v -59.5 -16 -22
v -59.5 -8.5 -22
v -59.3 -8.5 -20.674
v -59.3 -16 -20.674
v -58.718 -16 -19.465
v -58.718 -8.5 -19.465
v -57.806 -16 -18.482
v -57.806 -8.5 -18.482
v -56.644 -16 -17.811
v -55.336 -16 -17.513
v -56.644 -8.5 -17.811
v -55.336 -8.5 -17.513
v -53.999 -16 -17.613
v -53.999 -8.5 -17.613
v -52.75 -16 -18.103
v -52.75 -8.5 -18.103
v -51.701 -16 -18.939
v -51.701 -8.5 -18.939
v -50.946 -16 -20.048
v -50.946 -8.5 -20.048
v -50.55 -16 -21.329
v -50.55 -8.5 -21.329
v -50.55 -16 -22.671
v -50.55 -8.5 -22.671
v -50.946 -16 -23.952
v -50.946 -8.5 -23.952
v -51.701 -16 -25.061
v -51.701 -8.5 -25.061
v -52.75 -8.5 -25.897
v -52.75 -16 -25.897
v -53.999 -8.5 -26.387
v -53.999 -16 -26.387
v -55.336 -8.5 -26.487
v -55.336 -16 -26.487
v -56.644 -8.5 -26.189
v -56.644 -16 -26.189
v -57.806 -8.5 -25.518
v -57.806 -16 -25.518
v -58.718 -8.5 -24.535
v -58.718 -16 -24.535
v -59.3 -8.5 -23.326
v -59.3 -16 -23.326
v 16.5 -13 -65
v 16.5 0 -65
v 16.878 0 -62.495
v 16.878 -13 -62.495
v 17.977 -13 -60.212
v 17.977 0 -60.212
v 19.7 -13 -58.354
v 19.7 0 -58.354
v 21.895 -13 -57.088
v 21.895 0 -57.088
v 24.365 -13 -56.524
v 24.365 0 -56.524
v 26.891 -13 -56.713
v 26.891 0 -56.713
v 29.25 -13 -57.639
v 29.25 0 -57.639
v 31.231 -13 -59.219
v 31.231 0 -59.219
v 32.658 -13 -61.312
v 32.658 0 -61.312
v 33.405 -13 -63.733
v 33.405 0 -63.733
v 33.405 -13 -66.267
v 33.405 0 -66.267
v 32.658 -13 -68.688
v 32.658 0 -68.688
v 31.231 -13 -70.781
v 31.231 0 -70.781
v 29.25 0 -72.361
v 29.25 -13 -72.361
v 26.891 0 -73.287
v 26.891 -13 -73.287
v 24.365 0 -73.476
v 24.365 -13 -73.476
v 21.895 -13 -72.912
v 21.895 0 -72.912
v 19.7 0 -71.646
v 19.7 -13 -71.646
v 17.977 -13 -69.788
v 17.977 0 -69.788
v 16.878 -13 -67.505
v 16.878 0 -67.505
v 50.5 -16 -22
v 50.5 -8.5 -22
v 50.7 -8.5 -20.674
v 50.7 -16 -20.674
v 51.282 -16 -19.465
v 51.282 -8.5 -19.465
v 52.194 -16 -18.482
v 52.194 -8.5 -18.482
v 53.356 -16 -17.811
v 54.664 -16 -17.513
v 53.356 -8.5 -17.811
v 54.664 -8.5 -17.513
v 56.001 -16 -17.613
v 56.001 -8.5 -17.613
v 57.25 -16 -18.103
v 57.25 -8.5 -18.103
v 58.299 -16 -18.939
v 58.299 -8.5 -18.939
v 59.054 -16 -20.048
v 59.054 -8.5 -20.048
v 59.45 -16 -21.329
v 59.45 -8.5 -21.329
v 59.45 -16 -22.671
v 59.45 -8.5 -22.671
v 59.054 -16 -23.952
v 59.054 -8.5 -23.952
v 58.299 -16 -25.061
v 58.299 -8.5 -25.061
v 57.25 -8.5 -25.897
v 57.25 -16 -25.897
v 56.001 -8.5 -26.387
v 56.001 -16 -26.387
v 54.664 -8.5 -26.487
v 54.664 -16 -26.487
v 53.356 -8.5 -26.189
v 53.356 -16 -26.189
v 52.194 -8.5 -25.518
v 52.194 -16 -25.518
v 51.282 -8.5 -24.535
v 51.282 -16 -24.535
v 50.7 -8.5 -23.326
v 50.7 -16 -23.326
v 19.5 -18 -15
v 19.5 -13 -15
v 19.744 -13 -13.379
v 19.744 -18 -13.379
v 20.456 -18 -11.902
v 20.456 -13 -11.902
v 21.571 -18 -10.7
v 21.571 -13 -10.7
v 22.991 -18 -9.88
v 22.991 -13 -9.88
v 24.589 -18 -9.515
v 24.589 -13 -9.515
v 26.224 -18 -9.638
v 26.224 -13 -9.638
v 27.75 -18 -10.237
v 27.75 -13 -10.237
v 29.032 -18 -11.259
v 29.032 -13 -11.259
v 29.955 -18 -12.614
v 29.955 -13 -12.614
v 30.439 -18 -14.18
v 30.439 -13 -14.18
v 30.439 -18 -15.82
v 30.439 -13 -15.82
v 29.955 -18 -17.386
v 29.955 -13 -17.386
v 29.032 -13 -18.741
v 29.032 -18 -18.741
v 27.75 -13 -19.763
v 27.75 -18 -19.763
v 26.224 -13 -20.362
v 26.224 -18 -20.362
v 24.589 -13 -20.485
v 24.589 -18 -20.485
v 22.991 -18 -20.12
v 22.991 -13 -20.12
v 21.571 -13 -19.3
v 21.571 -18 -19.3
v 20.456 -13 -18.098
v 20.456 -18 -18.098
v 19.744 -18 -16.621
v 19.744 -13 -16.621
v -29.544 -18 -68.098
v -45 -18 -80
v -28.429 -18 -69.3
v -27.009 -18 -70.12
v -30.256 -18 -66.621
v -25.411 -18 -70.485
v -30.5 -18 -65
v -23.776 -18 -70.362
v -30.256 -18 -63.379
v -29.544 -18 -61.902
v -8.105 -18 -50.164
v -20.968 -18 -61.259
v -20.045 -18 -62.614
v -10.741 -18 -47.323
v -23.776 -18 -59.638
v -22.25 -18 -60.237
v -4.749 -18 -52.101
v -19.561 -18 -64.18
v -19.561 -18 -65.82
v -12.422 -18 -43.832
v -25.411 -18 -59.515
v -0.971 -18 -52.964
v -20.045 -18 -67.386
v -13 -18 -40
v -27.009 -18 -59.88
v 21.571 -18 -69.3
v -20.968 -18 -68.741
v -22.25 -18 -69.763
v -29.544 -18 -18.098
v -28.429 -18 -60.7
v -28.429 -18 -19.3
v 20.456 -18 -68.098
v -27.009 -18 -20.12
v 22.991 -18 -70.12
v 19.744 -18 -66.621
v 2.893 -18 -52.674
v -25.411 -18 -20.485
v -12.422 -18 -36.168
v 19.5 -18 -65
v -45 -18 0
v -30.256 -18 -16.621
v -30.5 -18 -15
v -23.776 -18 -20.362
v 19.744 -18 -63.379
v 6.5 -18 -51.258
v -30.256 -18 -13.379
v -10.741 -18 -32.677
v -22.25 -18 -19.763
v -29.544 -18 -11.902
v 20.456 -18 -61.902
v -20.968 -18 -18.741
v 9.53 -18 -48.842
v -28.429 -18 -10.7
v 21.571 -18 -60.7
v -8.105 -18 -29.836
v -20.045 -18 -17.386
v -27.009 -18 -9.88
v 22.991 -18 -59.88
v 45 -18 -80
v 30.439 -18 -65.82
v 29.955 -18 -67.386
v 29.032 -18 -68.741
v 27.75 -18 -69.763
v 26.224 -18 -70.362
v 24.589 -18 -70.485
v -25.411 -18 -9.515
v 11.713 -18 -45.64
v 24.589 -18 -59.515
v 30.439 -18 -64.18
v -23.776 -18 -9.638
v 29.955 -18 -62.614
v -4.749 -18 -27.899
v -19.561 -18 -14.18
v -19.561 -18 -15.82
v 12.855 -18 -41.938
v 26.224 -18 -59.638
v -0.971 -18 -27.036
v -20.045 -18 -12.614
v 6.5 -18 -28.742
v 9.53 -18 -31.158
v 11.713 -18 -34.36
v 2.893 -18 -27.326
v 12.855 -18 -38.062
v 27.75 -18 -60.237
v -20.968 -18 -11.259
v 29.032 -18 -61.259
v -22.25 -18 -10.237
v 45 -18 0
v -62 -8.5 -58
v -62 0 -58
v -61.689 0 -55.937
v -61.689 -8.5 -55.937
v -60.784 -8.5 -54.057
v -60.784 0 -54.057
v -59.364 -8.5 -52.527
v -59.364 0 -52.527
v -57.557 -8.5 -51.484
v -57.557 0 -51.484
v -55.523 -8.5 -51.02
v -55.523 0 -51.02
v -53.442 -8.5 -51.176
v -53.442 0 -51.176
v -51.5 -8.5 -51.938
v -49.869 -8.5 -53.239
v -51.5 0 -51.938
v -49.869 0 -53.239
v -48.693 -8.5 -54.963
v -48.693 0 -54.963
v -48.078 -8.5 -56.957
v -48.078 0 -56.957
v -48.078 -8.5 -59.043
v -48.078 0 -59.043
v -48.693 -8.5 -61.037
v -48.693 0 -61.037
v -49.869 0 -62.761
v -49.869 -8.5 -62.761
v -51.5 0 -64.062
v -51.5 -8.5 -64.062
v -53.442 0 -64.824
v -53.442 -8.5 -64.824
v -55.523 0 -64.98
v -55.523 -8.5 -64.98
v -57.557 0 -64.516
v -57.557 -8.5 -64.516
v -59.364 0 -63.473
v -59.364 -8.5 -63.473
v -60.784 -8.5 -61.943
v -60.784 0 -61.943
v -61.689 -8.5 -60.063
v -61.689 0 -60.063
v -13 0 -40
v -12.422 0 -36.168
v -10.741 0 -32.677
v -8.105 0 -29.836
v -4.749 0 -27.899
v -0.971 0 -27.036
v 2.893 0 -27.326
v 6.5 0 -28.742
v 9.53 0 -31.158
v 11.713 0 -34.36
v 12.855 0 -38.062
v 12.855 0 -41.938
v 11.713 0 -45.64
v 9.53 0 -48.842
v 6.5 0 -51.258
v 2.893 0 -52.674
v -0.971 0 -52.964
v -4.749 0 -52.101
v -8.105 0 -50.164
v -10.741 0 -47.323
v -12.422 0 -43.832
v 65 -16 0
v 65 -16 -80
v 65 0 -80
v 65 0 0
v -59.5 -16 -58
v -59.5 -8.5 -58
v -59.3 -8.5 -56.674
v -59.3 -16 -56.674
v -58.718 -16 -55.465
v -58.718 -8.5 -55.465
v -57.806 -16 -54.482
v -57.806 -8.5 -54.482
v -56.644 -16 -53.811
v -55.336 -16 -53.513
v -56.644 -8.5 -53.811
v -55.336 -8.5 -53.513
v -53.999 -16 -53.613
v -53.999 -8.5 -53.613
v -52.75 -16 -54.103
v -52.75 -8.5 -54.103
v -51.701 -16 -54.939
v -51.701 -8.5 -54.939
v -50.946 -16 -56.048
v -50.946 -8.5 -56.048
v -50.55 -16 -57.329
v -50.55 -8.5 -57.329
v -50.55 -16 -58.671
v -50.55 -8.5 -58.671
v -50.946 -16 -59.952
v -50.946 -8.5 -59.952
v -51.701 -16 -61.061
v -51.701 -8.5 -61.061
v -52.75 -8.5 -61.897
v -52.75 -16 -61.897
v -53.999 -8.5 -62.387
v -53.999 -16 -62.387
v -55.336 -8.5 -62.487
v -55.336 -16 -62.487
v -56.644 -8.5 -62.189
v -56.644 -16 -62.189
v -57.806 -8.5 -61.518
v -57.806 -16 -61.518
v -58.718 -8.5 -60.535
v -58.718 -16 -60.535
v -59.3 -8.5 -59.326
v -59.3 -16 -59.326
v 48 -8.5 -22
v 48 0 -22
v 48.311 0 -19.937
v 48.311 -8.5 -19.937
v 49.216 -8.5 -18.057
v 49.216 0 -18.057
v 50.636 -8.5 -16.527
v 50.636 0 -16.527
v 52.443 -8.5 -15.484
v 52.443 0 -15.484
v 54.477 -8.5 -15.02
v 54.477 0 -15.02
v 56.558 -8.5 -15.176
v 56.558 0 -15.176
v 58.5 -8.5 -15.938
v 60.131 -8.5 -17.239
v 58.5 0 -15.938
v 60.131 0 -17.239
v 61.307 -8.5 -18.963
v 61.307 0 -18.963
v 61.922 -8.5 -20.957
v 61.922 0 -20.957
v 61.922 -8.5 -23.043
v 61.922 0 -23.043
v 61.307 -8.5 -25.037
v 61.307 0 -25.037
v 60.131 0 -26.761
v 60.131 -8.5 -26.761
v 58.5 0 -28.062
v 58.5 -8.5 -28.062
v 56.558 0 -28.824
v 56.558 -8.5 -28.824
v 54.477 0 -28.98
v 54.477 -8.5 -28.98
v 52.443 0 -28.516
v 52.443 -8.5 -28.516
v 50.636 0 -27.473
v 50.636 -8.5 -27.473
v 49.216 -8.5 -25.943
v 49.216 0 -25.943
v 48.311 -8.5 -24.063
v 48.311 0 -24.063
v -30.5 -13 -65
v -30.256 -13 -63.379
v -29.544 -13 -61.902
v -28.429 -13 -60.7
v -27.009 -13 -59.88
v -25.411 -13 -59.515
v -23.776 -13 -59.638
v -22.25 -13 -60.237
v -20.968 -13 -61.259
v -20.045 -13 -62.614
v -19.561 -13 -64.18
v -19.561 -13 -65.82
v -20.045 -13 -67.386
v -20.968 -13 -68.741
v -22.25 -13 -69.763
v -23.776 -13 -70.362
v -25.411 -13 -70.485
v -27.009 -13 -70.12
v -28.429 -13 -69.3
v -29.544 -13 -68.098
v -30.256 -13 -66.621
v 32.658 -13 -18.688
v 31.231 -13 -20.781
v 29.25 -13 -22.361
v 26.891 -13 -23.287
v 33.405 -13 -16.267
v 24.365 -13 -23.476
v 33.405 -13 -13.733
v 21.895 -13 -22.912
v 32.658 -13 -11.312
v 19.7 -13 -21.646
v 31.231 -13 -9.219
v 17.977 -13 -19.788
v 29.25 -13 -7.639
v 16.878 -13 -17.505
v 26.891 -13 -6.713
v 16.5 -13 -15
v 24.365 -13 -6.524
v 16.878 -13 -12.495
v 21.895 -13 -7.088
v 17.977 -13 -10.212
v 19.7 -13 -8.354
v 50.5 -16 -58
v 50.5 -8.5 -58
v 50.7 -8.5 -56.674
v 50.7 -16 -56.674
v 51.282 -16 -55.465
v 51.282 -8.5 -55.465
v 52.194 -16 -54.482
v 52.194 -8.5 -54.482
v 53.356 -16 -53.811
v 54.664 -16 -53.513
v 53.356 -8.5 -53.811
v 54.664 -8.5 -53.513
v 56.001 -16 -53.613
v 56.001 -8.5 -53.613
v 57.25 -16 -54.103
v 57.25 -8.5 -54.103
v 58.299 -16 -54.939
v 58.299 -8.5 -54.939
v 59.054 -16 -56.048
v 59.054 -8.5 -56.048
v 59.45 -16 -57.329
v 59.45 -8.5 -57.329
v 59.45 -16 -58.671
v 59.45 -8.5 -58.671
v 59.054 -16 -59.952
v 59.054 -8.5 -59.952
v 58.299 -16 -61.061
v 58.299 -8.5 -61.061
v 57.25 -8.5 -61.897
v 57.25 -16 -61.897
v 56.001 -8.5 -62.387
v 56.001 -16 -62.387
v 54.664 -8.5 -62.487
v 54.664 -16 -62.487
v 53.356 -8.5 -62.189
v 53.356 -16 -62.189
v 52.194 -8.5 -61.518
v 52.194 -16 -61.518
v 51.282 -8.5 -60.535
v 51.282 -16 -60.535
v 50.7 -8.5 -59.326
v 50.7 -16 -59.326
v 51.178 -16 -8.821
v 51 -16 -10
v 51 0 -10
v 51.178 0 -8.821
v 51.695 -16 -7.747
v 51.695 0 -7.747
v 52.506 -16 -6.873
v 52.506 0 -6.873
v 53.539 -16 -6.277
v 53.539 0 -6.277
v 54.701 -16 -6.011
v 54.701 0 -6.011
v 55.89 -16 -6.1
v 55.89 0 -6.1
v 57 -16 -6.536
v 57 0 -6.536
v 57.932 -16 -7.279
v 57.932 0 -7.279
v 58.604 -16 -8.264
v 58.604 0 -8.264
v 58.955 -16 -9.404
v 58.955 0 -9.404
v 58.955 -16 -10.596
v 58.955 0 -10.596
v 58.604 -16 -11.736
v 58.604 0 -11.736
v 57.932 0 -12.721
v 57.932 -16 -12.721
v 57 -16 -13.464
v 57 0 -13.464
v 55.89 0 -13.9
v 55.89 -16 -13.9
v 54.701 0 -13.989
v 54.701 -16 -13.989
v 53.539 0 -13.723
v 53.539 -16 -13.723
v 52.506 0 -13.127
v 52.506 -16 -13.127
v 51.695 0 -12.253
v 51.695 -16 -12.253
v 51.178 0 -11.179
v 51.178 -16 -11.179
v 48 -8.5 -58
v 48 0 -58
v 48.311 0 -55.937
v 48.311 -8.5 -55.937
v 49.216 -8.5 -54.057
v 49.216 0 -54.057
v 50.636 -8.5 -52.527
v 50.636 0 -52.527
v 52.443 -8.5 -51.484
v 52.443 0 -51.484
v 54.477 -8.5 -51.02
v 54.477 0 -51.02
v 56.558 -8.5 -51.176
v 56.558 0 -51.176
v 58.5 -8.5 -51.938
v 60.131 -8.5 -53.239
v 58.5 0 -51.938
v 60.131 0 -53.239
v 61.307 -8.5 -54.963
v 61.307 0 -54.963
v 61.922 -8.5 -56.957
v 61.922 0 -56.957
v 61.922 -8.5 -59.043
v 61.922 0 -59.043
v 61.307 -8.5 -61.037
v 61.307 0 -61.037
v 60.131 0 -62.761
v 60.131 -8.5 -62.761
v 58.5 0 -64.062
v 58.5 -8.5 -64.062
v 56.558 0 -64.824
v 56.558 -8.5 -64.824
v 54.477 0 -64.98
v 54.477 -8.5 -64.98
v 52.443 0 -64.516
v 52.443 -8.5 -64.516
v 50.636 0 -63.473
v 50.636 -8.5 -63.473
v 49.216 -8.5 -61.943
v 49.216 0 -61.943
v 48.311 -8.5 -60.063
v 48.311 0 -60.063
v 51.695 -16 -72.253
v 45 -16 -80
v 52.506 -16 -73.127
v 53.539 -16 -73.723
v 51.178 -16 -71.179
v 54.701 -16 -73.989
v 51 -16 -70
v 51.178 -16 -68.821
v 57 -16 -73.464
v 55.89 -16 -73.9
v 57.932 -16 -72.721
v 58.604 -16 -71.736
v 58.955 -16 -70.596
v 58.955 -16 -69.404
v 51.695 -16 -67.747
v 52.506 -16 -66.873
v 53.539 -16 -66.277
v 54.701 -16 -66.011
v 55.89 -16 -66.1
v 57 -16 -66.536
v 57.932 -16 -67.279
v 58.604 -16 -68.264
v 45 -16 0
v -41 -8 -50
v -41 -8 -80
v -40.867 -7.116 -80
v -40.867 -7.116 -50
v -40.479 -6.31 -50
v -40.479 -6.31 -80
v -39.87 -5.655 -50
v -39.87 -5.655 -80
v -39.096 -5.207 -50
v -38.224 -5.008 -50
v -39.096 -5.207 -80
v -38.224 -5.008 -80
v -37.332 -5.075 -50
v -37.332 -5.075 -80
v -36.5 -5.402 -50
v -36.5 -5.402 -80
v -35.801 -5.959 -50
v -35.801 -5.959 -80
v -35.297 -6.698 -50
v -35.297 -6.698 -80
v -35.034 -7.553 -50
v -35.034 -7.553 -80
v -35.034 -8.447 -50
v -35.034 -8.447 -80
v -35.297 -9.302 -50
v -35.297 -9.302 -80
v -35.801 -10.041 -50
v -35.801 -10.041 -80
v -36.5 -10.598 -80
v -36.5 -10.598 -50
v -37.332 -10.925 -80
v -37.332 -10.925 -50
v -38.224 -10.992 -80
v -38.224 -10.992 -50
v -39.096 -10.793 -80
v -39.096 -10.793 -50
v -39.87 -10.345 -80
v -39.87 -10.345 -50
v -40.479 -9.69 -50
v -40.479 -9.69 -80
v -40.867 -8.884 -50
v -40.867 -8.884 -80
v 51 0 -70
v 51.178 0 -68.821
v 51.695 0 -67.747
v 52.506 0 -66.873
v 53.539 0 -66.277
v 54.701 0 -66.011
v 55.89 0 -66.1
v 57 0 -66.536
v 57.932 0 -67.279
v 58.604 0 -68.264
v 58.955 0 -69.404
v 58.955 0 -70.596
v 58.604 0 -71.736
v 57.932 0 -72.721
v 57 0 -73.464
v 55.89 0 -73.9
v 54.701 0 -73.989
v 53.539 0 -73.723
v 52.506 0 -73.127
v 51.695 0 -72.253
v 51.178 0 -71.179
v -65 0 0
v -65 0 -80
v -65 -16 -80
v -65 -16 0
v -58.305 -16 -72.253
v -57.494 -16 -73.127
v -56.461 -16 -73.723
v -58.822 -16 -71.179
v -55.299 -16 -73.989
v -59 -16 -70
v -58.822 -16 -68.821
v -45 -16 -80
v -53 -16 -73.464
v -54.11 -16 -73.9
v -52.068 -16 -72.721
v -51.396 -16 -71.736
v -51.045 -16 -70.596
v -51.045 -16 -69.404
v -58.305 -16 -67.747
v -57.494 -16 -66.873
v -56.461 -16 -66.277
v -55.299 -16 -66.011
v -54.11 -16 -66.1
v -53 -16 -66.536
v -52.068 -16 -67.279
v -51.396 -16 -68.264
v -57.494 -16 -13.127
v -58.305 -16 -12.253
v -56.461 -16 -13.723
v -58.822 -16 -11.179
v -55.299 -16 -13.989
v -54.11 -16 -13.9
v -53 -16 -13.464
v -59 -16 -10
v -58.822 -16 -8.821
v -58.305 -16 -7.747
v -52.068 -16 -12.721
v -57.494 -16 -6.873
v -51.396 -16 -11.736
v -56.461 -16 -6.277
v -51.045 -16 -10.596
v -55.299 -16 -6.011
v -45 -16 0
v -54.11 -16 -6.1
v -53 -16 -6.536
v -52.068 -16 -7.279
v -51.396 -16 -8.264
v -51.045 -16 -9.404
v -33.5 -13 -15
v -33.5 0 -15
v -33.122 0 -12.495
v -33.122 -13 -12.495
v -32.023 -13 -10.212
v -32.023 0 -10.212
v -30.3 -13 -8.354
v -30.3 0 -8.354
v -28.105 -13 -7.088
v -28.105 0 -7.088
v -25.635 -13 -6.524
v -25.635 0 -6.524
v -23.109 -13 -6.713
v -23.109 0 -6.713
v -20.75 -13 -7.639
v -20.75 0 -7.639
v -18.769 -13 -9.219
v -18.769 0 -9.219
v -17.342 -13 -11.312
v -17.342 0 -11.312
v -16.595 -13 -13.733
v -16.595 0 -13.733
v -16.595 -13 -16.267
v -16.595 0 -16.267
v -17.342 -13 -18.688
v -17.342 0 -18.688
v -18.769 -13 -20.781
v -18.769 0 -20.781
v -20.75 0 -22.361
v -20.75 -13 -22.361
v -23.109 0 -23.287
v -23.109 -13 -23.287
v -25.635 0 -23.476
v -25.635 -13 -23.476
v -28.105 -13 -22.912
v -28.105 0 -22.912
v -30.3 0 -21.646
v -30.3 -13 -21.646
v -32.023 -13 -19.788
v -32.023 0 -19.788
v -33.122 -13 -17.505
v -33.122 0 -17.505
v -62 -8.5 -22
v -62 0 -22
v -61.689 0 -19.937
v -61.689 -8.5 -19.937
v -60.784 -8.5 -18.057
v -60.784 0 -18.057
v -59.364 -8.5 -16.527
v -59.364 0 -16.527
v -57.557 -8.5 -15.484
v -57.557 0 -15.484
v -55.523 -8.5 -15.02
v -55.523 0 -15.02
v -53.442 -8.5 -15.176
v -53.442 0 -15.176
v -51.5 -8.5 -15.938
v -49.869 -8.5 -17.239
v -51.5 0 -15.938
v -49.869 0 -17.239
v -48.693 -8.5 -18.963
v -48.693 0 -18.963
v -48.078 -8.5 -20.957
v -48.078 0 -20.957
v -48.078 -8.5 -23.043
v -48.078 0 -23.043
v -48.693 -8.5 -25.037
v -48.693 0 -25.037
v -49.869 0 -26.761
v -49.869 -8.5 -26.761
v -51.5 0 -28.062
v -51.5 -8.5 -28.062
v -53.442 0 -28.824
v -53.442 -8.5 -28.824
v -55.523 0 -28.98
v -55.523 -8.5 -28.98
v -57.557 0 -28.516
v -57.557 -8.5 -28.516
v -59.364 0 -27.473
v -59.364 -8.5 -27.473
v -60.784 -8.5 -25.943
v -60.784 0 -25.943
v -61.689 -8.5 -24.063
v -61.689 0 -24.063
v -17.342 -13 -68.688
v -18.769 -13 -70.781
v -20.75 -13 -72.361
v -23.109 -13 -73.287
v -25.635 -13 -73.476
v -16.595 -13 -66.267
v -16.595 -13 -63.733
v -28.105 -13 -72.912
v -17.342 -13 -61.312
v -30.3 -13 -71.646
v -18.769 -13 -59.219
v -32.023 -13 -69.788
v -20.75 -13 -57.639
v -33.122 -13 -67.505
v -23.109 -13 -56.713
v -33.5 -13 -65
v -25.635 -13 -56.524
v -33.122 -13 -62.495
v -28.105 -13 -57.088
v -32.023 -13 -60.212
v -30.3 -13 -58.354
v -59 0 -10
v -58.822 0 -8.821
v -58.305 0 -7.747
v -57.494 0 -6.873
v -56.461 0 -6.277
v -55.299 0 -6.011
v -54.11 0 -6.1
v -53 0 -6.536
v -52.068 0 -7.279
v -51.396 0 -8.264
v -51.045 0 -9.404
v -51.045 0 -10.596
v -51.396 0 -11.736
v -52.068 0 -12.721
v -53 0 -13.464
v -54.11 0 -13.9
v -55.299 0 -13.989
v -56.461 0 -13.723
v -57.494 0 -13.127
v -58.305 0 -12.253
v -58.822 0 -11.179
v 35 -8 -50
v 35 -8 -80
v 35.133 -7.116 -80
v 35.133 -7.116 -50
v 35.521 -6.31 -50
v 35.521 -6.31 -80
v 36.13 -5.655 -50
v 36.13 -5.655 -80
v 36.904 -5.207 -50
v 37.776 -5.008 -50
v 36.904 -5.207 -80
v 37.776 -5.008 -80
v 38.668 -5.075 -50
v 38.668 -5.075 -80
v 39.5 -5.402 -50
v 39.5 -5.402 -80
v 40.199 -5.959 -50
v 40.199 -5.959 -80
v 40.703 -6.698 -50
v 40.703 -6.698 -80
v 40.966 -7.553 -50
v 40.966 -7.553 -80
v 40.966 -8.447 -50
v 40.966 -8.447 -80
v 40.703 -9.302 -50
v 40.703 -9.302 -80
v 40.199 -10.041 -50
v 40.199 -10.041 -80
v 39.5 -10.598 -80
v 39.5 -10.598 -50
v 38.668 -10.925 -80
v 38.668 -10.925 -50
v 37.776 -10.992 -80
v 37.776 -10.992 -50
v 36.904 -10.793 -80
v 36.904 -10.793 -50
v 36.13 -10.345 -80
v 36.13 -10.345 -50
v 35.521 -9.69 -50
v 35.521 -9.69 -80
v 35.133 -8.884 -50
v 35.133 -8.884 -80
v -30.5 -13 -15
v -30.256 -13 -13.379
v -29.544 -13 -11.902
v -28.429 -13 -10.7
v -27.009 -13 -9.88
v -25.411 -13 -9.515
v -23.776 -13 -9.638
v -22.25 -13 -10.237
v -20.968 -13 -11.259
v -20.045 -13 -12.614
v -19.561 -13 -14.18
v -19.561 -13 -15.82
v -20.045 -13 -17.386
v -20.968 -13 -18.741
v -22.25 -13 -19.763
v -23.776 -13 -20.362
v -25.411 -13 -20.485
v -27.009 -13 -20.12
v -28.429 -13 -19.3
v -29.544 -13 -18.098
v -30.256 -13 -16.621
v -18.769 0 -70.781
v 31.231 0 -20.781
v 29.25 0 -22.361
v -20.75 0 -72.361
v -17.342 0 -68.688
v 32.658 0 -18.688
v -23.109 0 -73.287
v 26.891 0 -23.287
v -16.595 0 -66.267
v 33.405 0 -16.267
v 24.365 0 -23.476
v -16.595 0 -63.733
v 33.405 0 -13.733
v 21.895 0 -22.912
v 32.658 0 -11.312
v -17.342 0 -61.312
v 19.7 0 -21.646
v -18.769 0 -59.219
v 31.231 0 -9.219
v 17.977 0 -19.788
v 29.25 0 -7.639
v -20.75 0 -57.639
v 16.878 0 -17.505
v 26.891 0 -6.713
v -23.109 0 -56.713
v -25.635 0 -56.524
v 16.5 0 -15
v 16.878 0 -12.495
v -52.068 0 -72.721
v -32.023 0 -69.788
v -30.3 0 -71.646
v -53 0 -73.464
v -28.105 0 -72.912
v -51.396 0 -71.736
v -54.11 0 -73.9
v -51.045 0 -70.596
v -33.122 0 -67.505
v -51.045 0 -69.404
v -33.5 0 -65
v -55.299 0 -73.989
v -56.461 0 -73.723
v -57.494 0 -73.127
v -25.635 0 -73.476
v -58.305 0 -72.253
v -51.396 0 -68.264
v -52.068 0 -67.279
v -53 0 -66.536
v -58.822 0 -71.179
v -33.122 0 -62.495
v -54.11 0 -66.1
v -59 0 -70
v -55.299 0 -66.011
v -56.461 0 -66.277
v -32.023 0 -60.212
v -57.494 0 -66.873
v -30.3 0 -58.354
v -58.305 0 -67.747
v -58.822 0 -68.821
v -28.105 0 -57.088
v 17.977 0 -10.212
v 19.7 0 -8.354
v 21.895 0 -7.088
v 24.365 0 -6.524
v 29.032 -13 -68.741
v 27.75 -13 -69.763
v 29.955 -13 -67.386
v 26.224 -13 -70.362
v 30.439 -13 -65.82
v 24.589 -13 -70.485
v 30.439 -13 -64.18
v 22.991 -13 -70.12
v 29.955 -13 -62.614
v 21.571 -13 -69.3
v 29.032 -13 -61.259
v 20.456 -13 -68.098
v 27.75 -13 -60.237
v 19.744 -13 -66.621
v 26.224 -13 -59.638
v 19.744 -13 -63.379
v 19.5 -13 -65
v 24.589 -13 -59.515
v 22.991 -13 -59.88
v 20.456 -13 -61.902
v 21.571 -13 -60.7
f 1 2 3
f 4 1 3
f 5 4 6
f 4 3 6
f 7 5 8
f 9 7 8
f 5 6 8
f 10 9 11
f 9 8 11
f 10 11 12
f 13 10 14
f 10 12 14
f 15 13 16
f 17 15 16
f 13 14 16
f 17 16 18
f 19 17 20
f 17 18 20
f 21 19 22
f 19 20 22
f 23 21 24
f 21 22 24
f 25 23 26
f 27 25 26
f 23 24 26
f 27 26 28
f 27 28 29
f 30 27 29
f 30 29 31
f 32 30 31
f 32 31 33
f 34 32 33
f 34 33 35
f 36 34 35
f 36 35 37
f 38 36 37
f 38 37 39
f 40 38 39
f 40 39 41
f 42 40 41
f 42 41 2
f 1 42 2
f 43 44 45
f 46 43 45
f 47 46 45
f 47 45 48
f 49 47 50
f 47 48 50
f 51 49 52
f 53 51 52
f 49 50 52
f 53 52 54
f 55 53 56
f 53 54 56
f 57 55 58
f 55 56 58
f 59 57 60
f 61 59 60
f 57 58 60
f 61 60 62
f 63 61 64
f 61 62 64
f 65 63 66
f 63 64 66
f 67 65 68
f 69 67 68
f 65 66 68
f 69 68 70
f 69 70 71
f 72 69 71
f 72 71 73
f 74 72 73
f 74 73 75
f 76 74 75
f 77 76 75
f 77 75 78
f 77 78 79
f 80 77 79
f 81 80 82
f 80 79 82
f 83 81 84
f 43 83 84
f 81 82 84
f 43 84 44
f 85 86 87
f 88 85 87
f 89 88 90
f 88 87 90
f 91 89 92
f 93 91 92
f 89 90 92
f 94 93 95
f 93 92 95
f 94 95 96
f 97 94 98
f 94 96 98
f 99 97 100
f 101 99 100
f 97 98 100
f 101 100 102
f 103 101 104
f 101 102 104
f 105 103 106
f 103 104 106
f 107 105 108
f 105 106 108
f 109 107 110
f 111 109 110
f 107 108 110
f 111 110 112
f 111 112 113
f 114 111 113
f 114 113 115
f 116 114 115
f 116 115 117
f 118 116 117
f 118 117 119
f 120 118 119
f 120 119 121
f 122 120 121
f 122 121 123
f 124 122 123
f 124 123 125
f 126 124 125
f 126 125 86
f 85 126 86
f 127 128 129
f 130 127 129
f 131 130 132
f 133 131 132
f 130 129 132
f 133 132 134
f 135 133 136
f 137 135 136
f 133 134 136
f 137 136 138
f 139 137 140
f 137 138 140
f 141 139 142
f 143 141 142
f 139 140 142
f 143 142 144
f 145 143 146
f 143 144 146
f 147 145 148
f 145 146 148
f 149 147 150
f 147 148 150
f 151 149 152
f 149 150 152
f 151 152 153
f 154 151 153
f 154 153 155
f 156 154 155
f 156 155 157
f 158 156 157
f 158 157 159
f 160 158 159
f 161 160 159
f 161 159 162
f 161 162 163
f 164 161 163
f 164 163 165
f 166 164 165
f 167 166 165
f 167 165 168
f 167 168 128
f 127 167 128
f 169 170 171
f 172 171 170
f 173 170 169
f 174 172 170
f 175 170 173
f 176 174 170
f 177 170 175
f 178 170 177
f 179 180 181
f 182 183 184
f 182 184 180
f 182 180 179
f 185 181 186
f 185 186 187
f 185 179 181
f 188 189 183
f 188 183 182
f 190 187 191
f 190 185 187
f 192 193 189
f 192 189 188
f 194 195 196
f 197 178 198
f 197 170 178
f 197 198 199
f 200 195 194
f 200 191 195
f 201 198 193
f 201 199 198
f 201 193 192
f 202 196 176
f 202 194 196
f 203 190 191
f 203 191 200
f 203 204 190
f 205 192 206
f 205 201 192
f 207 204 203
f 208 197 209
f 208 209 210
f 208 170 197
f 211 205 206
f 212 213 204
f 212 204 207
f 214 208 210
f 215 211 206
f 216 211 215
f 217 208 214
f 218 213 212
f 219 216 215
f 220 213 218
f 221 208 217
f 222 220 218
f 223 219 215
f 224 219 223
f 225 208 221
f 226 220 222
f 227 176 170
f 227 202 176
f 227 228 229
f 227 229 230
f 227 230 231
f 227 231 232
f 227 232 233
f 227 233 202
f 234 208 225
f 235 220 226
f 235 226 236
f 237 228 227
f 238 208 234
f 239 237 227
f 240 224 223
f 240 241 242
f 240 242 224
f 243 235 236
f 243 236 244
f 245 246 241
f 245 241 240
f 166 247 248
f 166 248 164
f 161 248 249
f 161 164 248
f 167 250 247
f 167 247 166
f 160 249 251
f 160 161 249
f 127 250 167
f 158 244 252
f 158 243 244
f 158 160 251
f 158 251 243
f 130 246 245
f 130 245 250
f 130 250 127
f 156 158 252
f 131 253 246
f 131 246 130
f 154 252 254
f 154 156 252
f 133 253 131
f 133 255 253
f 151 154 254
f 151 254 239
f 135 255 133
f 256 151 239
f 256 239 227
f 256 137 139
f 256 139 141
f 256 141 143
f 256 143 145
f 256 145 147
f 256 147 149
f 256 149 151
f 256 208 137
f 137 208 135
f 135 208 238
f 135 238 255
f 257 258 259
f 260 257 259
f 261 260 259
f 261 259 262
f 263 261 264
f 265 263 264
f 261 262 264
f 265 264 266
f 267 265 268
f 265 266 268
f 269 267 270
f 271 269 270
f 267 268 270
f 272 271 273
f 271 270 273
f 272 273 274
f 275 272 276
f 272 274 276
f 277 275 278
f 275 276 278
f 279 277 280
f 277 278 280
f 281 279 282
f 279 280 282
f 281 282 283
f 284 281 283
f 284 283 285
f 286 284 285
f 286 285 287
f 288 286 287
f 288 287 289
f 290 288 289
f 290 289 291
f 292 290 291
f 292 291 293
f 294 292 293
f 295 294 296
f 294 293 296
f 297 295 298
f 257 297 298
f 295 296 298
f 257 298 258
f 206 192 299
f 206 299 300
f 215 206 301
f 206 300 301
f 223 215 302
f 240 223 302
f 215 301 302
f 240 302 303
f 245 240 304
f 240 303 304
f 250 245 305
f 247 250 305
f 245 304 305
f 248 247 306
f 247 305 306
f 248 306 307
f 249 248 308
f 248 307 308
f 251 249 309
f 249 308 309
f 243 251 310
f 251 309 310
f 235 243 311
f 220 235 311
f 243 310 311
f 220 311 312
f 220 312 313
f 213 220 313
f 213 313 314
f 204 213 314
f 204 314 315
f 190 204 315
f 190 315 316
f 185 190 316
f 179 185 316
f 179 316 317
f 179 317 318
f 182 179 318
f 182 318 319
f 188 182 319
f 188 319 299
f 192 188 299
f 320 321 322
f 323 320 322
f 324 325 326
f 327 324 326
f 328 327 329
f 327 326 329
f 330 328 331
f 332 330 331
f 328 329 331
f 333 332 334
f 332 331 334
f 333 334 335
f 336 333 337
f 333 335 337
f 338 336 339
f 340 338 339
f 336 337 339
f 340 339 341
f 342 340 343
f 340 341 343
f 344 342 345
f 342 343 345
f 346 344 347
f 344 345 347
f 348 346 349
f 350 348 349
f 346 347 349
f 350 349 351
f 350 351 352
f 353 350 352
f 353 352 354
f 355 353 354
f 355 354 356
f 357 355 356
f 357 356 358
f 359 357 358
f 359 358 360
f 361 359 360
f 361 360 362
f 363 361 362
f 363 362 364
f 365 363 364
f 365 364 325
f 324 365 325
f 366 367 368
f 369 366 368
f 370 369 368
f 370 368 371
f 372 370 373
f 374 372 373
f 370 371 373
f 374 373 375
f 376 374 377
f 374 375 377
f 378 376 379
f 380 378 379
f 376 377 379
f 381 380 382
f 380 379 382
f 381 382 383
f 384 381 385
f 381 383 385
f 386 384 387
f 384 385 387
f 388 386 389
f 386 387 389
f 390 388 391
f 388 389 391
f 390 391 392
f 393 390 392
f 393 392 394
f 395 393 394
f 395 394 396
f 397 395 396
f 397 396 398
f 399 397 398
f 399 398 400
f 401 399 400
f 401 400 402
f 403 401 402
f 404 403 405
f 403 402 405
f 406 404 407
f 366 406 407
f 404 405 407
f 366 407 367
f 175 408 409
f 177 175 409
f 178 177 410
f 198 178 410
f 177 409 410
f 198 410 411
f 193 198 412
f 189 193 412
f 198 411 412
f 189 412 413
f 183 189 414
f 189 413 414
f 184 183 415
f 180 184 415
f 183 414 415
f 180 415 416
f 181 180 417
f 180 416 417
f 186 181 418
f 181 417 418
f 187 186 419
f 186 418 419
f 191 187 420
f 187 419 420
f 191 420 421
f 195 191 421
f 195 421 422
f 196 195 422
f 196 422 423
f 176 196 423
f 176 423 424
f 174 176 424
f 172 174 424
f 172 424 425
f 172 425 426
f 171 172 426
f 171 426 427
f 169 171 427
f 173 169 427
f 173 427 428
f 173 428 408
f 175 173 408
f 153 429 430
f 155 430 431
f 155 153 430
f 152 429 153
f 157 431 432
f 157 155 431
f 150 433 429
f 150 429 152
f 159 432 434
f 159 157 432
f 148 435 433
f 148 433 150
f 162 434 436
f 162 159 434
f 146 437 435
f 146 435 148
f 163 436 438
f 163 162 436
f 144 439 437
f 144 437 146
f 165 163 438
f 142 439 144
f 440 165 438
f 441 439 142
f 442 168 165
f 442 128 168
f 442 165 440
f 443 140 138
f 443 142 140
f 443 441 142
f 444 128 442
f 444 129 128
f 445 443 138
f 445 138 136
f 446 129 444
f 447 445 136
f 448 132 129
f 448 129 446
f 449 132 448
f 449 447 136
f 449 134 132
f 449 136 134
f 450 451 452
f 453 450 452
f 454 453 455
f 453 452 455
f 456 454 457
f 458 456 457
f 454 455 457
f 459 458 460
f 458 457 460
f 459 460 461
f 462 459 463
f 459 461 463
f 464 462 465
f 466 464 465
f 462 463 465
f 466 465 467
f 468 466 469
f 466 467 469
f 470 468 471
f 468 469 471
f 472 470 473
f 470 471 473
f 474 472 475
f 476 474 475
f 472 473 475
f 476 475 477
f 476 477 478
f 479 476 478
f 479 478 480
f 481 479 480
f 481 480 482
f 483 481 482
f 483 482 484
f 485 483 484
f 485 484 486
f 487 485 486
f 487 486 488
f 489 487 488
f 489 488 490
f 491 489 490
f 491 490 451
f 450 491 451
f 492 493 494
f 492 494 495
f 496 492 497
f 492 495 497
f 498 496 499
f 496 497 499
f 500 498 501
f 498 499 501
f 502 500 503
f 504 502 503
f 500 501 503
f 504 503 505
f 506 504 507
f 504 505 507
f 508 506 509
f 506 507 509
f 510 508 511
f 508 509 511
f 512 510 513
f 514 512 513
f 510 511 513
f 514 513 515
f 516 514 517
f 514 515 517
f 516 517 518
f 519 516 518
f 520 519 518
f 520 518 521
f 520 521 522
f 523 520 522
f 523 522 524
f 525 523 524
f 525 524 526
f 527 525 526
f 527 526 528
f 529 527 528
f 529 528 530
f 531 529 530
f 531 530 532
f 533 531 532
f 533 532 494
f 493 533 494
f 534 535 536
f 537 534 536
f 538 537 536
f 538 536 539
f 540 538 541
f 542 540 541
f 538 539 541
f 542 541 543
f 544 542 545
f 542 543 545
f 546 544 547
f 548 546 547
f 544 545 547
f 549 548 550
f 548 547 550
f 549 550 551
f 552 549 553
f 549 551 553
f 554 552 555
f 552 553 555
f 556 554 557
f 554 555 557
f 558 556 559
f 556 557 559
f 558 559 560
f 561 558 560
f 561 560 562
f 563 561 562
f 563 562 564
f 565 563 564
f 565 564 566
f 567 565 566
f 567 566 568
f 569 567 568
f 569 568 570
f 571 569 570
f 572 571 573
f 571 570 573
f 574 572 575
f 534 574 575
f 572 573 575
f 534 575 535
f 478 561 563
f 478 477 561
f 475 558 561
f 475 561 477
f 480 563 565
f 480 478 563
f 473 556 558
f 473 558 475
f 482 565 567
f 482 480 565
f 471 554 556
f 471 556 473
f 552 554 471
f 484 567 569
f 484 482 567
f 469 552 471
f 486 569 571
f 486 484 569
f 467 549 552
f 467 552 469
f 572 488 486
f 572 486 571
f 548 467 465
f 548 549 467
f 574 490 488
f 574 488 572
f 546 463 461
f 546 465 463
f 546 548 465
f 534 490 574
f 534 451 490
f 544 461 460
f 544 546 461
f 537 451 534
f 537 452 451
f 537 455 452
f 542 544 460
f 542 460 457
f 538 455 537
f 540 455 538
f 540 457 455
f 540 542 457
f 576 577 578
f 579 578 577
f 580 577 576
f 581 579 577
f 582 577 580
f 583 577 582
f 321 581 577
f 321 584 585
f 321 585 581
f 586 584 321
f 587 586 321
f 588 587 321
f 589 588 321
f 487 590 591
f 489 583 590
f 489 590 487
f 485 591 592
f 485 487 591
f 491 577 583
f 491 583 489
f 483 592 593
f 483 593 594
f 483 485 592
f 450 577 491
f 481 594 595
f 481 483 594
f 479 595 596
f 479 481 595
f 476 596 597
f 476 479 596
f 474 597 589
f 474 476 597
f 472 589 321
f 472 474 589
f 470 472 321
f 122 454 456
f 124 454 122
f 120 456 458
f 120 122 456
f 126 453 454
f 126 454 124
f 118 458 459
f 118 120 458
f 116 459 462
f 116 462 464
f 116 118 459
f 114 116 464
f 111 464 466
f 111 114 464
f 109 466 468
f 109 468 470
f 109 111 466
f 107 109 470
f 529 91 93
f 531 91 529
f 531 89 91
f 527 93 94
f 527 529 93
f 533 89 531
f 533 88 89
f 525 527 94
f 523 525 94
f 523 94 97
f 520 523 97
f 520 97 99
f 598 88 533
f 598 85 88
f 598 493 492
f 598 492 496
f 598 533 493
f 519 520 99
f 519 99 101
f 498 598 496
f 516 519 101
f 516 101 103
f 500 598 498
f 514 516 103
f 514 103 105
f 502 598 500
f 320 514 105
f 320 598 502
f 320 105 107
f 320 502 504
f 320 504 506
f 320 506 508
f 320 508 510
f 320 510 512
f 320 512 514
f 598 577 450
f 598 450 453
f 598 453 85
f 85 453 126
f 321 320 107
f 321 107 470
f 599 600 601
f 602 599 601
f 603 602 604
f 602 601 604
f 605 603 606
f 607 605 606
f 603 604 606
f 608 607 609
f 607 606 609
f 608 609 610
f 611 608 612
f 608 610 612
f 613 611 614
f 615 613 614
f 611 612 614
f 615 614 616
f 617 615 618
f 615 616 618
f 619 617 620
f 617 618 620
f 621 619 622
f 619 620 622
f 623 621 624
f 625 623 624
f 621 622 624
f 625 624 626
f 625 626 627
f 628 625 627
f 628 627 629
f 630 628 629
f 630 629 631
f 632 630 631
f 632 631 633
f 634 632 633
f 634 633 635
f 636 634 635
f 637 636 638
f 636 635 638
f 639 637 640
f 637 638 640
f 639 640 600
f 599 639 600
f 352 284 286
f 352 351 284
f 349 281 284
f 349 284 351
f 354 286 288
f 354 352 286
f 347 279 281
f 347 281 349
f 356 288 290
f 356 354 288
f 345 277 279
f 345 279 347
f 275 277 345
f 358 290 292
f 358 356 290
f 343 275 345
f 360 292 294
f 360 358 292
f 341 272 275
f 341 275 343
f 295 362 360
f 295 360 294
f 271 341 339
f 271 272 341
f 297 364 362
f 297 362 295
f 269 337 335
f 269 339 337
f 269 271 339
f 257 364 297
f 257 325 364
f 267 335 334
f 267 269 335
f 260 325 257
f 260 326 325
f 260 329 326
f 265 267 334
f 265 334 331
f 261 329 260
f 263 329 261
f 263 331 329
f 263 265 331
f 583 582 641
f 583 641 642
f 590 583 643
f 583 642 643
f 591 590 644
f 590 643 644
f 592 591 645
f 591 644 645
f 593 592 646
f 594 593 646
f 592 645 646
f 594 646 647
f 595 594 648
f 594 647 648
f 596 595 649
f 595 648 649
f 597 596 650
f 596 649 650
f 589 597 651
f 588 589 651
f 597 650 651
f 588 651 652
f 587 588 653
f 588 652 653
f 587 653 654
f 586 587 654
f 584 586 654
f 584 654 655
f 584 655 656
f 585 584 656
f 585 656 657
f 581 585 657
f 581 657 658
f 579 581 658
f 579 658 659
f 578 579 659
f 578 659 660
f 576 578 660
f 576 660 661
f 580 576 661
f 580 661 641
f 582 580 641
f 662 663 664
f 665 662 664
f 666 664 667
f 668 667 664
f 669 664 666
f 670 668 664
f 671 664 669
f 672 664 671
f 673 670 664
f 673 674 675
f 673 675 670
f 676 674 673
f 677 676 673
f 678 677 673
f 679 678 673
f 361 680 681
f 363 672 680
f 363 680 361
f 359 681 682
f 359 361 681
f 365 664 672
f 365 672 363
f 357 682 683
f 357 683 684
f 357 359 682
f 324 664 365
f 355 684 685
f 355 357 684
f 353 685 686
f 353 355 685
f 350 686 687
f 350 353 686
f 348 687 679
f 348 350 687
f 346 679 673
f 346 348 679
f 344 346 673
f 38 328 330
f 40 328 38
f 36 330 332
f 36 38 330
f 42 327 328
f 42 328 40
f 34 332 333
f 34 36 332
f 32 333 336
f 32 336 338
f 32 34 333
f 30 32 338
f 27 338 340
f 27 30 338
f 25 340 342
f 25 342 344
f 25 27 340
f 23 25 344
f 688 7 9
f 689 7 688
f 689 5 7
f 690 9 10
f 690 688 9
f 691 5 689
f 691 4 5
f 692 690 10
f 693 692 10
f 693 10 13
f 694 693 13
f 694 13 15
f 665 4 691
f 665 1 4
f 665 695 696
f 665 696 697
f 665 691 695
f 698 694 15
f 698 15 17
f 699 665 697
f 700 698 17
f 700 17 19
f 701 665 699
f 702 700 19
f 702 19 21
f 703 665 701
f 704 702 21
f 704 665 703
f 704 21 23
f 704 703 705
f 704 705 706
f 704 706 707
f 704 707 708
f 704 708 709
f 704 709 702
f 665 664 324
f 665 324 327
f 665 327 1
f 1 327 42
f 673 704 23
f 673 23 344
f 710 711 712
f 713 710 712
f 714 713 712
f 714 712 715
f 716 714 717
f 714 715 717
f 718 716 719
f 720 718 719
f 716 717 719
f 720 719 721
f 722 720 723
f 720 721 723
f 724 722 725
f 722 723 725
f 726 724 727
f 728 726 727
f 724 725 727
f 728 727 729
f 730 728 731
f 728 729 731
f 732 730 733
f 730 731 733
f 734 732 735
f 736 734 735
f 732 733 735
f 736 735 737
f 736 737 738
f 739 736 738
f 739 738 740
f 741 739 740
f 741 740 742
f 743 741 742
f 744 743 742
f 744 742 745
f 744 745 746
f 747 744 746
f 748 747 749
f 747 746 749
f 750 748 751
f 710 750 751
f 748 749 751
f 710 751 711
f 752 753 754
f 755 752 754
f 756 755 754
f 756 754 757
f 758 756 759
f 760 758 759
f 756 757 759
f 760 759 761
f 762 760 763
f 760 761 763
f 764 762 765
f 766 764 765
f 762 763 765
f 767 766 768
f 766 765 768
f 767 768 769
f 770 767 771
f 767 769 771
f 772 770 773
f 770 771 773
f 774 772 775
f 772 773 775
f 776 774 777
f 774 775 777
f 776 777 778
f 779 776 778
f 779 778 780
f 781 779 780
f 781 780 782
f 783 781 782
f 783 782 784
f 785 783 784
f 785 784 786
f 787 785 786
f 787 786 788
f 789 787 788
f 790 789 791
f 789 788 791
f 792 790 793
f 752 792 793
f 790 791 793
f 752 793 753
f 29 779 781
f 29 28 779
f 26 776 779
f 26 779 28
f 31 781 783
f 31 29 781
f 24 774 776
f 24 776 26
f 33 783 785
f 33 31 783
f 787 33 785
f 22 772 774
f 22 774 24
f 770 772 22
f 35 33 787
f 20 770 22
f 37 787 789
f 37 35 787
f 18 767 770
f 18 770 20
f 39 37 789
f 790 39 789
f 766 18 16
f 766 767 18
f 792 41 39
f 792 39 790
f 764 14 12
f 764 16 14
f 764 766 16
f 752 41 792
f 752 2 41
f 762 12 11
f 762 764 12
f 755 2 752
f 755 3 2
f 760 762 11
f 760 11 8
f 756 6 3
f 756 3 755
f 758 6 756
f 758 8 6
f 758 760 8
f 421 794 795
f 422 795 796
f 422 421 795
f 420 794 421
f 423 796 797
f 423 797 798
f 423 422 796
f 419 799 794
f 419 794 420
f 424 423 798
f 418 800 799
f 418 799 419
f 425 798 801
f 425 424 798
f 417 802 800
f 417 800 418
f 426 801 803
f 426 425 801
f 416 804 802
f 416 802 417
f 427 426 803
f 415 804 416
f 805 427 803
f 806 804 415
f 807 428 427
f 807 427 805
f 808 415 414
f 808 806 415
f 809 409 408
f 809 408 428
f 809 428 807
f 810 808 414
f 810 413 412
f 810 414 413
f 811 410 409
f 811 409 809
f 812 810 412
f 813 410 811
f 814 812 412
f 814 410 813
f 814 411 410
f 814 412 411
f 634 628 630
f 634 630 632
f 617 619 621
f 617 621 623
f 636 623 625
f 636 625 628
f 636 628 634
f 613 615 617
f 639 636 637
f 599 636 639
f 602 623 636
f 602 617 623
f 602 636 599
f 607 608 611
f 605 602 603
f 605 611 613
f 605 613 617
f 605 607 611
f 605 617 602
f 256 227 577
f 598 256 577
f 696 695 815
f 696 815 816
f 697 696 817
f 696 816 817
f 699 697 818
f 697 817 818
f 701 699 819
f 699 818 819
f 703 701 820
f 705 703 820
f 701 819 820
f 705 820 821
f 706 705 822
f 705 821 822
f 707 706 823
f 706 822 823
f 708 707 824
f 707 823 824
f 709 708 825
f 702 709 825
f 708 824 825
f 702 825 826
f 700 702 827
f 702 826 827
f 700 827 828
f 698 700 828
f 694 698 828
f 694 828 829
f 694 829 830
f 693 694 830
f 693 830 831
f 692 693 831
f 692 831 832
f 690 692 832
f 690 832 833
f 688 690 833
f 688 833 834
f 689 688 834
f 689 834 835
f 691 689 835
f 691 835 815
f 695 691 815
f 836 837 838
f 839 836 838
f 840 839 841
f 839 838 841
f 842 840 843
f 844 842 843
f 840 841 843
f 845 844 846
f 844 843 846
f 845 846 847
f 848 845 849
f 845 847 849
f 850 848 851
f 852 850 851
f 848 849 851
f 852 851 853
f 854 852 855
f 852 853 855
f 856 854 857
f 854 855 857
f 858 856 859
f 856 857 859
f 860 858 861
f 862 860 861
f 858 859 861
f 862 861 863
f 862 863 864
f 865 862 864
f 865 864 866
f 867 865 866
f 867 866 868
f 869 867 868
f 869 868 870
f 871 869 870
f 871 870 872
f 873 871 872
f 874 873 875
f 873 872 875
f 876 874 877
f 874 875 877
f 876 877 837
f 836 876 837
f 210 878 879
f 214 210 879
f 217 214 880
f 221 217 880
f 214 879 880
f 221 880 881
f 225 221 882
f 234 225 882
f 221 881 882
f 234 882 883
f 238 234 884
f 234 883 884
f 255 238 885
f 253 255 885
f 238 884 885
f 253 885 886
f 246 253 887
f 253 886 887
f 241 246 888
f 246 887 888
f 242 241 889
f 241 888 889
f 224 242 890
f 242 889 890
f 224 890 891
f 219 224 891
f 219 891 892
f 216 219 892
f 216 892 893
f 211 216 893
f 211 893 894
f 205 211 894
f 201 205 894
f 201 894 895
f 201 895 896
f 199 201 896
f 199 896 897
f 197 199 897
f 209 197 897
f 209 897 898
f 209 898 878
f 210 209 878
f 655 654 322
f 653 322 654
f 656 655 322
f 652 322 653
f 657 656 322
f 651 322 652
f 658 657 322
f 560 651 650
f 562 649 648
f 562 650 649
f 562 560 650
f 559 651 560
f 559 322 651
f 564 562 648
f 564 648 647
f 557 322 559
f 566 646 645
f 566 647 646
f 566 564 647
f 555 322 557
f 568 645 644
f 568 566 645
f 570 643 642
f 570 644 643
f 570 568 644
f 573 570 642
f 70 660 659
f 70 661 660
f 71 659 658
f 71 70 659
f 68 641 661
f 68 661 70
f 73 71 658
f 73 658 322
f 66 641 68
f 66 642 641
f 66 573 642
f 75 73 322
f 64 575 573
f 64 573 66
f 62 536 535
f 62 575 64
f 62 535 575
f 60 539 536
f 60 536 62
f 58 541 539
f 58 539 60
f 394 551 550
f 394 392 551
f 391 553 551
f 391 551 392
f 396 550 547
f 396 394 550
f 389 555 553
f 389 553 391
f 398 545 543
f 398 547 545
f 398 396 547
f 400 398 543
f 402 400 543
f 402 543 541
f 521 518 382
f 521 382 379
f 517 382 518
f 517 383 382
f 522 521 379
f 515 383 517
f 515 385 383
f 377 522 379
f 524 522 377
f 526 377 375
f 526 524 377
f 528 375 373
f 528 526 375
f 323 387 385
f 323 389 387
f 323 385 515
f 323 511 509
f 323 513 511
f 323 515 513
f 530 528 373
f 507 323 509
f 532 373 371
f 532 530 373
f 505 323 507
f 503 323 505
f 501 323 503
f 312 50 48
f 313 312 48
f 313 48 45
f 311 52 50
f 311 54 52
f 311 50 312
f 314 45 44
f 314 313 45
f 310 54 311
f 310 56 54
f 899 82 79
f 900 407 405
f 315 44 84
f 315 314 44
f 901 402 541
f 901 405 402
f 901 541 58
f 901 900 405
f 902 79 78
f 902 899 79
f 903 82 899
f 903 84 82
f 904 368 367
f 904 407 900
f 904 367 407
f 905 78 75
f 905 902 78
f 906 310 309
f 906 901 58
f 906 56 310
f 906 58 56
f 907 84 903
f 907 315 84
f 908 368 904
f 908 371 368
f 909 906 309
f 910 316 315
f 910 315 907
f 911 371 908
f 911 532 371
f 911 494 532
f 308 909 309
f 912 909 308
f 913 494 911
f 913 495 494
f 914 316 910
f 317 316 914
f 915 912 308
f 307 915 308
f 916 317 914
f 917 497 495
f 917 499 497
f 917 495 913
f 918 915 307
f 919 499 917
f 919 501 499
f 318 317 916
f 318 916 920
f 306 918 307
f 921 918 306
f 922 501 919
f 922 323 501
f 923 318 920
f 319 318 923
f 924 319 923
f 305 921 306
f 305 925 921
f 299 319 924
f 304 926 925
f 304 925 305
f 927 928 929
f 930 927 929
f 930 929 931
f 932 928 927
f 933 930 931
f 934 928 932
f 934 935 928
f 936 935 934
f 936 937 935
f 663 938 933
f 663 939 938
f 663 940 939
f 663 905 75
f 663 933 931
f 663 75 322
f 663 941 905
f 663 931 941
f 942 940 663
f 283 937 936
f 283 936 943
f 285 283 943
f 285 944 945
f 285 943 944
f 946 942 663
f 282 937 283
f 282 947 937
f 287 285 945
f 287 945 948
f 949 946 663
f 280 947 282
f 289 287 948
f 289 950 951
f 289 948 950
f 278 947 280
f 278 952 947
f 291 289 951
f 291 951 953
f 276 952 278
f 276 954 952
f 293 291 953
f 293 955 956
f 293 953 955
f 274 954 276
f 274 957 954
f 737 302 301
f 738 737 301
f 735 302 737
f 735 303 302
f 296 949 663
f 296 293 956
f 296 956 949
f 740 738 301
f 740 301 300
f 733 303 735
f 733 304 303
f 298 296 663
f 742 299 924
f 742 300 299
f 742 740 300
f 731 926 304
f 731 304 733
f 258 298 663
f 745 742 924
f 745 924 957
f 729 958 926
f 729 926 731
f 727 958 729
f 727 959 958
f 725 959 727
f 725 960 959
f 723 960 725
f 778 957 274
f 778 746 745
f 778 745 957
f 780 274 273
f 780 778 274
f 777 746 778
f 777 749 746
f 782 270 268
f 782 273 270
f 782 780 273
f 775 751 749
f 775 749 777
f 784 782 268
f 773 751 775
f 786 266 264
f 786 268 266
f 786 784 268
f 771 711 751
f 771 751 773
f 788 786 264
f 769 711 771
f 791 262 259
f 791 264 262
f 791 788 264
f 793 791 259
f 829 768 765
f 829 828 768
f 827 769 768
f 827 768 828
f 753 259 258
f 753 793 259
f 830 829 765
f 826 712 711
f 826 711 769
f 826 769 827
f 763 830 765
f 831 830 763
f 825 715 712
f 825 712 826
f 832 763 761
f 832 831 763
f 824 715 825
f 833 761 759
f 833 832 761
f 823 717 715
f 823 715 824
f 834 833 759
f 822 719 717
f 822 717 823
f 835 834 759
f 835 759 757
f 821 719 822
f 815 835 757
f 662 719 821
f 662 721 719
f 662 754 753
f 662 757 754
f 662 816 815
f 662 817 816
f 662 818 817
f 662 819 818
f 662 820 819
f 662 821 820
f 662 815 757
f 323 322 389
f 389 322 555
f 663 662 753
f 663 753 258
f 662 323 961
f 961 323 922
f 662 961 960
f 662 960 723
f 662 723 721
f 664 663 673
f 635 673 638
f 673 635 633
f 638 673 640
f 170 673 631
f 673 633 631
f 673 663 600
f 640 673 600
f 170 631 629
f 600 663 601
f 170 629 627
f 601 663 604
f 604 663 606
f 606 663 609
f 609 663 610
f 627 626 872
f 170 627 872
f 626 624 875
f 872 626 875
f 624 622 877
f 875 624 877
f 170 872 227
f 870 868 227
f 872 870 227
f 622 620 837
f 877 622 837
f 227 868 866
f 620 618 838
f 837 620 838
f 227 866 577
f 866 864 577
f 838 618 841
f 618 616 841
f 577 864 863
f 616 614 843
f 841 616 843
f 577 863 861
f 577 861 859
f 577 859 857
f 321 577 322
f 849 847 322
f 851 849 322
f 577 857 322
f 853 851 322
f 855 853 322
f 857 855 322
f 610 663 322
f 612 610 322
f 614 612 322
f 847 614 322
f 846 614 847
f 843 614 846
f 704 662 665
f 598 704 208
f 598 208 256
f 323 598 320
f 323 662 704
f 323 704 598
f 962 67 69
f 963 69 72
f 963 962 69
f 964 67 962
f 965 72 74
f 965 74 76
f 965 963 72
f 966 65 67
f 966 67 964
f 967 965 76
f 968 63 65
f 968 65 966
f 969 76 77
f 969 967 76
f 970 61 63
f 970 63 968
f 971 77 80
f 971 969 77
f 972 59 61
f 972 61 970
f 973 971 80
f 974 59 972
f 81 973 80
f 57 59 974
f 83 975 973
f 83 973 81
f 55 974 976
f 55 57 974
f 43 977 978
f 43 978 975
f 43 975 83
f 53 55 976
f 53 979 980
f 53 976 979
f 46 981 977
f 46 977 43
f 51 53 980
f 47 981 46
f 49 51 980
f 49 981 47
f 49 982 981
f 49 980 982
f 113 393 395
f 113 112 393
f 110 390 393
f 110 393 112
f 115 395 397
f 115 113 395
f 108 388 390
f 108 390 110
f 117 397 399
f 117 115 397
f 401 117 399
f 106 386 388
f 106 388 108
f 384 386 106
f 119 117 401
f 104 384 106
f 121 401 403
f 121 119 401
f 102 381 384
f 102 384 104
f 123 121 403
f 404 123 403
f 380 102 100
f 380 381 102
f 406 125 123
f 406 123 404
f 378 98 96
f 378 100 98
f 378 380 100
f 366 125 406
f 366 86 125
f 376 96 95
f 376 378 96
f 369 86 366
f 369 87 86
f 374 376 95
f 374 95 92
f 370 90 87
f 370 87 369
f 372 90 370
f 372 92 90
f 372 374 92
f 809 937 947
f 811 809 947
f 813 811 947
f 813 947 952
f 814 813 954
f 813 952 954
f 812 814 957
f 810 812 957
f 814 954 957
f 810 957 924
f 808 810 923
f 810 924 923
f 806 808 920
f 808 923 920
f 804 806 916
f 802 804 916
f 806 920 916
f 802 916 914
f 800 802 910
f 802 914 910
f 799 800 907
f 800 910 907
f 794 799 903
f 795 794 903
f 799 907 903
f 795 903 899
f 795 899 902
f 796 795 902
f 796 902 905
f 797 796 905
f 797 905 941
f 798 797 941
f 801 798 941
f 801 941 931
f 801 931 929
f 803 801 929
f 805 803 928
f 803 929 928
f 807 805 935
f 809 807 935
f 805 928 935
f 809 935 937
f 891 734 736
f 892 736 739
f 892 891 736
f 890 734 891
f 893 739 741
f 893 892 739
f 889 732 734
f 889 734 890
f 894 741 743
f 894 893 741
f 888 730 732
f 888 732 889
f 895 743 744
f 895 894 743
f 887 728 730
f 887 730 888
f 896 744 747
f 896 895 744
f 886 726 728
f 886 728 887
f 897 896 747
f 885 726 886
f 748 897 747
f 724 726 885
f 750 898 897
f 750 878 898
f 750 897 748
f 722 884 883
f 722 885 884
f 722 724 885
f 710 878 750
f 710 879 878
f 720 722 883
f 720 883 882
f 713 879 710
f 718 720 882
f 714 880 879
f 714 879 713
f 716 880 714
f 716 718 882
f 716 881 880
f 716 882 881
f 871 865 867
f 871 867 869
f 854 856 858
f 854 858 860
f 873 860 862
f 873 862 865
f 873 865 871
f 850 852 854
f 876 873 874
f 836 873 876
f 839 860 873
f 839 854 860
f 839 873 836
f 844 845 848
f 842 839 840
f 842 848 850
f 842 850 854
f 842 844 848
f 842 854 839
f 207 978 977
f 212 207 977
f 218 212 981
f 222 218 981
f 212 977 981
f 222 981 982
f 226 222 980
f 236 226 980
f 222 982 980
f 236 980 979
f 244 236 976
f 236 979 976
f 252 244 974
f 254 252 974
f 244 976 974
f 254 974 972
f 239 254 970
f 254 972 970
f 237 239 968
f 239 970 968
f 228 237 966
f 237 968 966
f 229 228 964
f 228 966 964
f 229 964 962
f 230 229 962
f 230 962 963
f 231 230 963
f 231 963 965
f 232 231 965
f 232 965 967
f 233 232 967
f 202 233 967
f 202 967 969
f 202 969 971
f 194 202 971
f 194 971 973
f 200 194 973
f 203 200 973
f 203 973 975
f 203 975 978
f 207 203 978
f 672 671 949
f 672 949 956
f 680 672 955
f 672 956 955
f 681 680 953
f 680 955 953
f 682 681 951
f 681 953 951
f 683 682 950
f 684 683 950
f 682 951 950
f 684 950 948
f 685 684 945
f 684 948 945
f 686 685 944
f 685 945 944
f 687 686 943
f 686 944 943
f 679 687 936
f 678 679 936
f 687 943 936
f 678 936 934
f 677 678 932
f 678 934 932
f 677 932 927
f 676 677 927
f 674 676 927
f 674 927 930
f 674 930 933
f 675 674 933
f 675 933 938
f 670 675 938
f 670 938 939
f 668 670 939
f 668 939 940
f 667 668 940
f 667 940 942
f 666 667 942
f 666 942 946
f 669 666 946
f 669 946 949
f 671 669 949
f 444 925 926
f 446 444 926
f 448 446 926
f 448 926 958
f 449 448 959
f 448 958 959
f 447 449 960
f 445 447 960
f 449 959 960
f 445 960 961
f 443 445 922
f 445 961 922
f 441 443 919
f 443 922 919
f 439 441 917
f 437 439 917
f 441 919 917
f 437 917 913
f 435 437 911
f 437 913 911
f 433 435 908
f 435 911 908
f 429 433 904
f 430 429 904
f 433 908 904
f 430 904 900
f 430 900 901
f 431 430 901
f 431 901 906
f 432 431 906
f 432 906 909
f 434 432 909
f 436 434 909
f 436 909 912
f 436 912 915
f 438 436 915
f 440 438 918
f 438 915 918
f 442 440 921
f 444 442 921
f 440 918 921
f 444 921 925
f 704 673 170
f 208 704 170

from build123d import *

# Parameters (mm, degrees)
SALIENTE_EXTRUIR1_DEPTH = 80
CROQUIS2_R              = 13
CROQUIS2_R_2            = 4
CROQUIS2_R_3            = 4.5
CORTAR_EXTRUIR1_DEPTH   = 105.637469388
CROQUIS4_R              = 7
CORTAR_EXTRUIR2_DEPTH   = 8.5
CORTAR_EXTRUIR3_REACH   = 106.637
CROQUIS5_R              = 5.5
CROQUIS6_R              = 8.5
CORTAR_EXTRUIR4_DEPTH   = 13
CROQUIS7_R              = 3
CORTAR_EXTRUIR5_DEPTH   = 30


with BuildPart() as part:
    # Croquis1 → Saliente-Extruir1 (new body)
    with BuildSketch(Plane.XY):
        Polygon((65, 0), (-65, 0), (-65, -16), (-45, -16), (-45, -18), (45, -18), (45, -16), (65, -16), align=None)
    extrude(amount=-SALIENTE_EXTRUIR1_DEPTH)

    # Croquis2 → Cortar-Extruir1 (cut, through all)
    with BuildSketch(Plane(origin=(0, 0, 0), x_dir=(1, 0, 0), z_dir=(0, 1, 0))):
        with Locations(Location((0, 40, 0), (0, 0, 180))):
            Circle(CROQUIS2_R)
        with Locations(Location((-55, 70, 0), (0, 0, 180))):
            Circle(CROQUIS2_R_2)
        with Locations(Location((-55, 10, 0), (0, 0, 180))):
            Circle(CROQUIS2_R_2)
        with Locations(Location((55, 10, 0), (0, 0, 180))):
            Circle(CROQUIS2_R_2)
        with Locations(Location((55, 70, 0), (0, 0, 180))):
            Circle(CROQUIS2_R_2)
        with Locations(Location((-55, 58, 0), (0, 0, 180))):
            Circle(CROQUIS2_R_3)
        with Locations(Location((-55, 22, 0), (0, 0, 180))):
            Circle(CROQUIS2_R_3)
        with Locations(Location((55, 58, 0), (0, 0, 180))):
            Circle(CROQUIS2_R_3)
        with Locations(Location((55, 22, 0), (0, 0, 180))):
            Circle(CROQUIS2_R_3)
    extrude(amount=-CORTAR_EXTRUIR1_DEPTH, mode=Mode.SUBTRACT)

    # Croquis4 → Cortar-Extruir2 (cut)
    with BuildSketch(Plane(origin=(0, 0, 0), x_dir=(1, 0, 0), z_dir=(0, 1, 0))):
        with Locations(Location((-55, 58, 0), (0, 0, 180))):
            Circle(CROQUIS4_R)
        with Locations(Location((-55, 22, 0), (0, 0, 180))):
            Circle(CROQUIS4_R)
        with Locations(Location((55, 58, 0), (0, 0, 180))):
            Circle(CROQUIS4_R)
        with Locations(Location((55, 22, 0), (0, 0, 180))):
            Circle(CROQUIS4_R)
    extrude(amount=-CORTAR_EXTRUIR2_DEPTH, mode=Mode.SUBTRACT)

    # Croquis5 → Cortar-Extruir3 (cut, up to next)
    with BuildSketch(Plane(origin=(0, 0, 0), x_dir=(1, 0, 0), z_dir=(0, 1, 0)), mode=Mode.PRIVATE) as cortar_extruir3_sk1:
        with Locations(Location((-25, 65, 0), (0, 0, 180))):
            Circle(CROQUIS5_R)
    cortar_extruir3_tool1 = extrude(cortar_extruir3_sk1.sketch, amount=-CORTAR_EXTRUIR3_REACH, mode=Mode.PRIVATE) & part.part
    # Croquis5 → Cortar-Extruir3 (cut, up to next)
    with BuildSketch(Plane(origin=(0, 0, 0), x_dir=(1, 0, 0), z_dir=(0, 1, 0)), mode=Mode.PRIVATE) as cortar_extruir3_sk2:
        with Locations(Location((-25, 15, 0), (0, 0, 180))):
            Circle(CROQUIS5_R)
    cortar_extruir3_tool2 = extrude(cortar_extruir3_sk2.sketch, amount=-CORTAR_EXTRUIR3_REACH, mode=Mode.PRIVATE) & part.part
    # Croquis5 → Cortar-Extruir3 (cut, up to next)
    with BuildSketch(Plane(origin=(0, 0, 0), x_dir=(1, 0, 0), z_dir=(0, 1, 0)), mode=Mode.PRIVATE) as cortar_extruir3_sk3:
        with Locations(Location((25, 15, 0), (0, 0, 180))):
            Circle(CROQUIS5_R)
    cortar_extruir3_tool3 = extrude(cortar_extruir3_sk3.sketch, amount=-CORTAR_EXTRUIR3_REACH, mode=Mode.PRIVATE) & part.part
    # Croquis5 → Cortar-Extruir3 (cut, up to next)
    with BuildSketch(Plane(origin=(0, 0, 0), x_dir=(1, 0, 0), z_dir=(0, 1, 0)), mode=Mode.PRIVATE) as cortar_extruir3_sk4:
        with Locations(Location((25, 65, 0), (0, 0, 180))):
            Circle(CROQUIS5_R)
    cortar_extruir3_tool4 = extrude(cortar_extruir3_sk4.sketch, amount=-CORTAR_EXTRUIR3_REACH, mode=Mode.PRIVATE) & part.part
    add(cortar_extruir3_tool1.solids().sort_by_distance((-25, 0, -65))[0], mode=Mode.SUBTRACT)
    add(cortar_extruir3_tool2.solids().sort_by_distance((-25, 0, -15))[0], mode=Mode.SUBTRACT)
    add(cortar_extruir3_tool3.solids().sort_by_distance((25, 0, -15))[0], mode=Mode.SUBTRACT)
    add(cortar_extruir3_tool4.solids().sort_by_distance((25, 0, -65))[0], mode=Mode.SUBTRACT)

    # Croquis6 → Cortar-Extruir4 (cut)
    with BuildSketch(Plane(origin=(0, 0, 0), x_dir=(1, 0, 0), z_dir=(0, 1, 0))):
        with Locations(Location((-25, 65, 0), (0, 0, 180))):
            Circle(CROQUIS6_R)
        with Locations(Location((-25, 15, 0), (0, 0, 180))):
            Circle(CROQUIS6_R)
        with Locations(Location((25, 15, 0), (0, 0, 180))):
            Circle(CROQUIS6_R)
        with Locations(Location((25, 65, 0), (0, 0, 180))):
            Circle(CROQUIS6_R)
    extrude(amount=-CORTAR_EXTRUIR4_DEPTH, mode=Mode.SUBTRACT)

    # Croquis7 → Cortar-Extruir5 (cut)
    with BuildSketch(Plane(origin=(0, 0, -80), x_dir=(-1, 0, 0), z_dir=(0, 0, -1))):
        with Locations((38, -8)):
            Circle(CROQUIS7_R)
        with Locations((-38, -8)):
            Circle(CROQUIS7_R)
    extrude(amount=-CORTAR_EXTRUIR5_DEPTH, mode=Mode.SUBTRACT)


solid = part.part
